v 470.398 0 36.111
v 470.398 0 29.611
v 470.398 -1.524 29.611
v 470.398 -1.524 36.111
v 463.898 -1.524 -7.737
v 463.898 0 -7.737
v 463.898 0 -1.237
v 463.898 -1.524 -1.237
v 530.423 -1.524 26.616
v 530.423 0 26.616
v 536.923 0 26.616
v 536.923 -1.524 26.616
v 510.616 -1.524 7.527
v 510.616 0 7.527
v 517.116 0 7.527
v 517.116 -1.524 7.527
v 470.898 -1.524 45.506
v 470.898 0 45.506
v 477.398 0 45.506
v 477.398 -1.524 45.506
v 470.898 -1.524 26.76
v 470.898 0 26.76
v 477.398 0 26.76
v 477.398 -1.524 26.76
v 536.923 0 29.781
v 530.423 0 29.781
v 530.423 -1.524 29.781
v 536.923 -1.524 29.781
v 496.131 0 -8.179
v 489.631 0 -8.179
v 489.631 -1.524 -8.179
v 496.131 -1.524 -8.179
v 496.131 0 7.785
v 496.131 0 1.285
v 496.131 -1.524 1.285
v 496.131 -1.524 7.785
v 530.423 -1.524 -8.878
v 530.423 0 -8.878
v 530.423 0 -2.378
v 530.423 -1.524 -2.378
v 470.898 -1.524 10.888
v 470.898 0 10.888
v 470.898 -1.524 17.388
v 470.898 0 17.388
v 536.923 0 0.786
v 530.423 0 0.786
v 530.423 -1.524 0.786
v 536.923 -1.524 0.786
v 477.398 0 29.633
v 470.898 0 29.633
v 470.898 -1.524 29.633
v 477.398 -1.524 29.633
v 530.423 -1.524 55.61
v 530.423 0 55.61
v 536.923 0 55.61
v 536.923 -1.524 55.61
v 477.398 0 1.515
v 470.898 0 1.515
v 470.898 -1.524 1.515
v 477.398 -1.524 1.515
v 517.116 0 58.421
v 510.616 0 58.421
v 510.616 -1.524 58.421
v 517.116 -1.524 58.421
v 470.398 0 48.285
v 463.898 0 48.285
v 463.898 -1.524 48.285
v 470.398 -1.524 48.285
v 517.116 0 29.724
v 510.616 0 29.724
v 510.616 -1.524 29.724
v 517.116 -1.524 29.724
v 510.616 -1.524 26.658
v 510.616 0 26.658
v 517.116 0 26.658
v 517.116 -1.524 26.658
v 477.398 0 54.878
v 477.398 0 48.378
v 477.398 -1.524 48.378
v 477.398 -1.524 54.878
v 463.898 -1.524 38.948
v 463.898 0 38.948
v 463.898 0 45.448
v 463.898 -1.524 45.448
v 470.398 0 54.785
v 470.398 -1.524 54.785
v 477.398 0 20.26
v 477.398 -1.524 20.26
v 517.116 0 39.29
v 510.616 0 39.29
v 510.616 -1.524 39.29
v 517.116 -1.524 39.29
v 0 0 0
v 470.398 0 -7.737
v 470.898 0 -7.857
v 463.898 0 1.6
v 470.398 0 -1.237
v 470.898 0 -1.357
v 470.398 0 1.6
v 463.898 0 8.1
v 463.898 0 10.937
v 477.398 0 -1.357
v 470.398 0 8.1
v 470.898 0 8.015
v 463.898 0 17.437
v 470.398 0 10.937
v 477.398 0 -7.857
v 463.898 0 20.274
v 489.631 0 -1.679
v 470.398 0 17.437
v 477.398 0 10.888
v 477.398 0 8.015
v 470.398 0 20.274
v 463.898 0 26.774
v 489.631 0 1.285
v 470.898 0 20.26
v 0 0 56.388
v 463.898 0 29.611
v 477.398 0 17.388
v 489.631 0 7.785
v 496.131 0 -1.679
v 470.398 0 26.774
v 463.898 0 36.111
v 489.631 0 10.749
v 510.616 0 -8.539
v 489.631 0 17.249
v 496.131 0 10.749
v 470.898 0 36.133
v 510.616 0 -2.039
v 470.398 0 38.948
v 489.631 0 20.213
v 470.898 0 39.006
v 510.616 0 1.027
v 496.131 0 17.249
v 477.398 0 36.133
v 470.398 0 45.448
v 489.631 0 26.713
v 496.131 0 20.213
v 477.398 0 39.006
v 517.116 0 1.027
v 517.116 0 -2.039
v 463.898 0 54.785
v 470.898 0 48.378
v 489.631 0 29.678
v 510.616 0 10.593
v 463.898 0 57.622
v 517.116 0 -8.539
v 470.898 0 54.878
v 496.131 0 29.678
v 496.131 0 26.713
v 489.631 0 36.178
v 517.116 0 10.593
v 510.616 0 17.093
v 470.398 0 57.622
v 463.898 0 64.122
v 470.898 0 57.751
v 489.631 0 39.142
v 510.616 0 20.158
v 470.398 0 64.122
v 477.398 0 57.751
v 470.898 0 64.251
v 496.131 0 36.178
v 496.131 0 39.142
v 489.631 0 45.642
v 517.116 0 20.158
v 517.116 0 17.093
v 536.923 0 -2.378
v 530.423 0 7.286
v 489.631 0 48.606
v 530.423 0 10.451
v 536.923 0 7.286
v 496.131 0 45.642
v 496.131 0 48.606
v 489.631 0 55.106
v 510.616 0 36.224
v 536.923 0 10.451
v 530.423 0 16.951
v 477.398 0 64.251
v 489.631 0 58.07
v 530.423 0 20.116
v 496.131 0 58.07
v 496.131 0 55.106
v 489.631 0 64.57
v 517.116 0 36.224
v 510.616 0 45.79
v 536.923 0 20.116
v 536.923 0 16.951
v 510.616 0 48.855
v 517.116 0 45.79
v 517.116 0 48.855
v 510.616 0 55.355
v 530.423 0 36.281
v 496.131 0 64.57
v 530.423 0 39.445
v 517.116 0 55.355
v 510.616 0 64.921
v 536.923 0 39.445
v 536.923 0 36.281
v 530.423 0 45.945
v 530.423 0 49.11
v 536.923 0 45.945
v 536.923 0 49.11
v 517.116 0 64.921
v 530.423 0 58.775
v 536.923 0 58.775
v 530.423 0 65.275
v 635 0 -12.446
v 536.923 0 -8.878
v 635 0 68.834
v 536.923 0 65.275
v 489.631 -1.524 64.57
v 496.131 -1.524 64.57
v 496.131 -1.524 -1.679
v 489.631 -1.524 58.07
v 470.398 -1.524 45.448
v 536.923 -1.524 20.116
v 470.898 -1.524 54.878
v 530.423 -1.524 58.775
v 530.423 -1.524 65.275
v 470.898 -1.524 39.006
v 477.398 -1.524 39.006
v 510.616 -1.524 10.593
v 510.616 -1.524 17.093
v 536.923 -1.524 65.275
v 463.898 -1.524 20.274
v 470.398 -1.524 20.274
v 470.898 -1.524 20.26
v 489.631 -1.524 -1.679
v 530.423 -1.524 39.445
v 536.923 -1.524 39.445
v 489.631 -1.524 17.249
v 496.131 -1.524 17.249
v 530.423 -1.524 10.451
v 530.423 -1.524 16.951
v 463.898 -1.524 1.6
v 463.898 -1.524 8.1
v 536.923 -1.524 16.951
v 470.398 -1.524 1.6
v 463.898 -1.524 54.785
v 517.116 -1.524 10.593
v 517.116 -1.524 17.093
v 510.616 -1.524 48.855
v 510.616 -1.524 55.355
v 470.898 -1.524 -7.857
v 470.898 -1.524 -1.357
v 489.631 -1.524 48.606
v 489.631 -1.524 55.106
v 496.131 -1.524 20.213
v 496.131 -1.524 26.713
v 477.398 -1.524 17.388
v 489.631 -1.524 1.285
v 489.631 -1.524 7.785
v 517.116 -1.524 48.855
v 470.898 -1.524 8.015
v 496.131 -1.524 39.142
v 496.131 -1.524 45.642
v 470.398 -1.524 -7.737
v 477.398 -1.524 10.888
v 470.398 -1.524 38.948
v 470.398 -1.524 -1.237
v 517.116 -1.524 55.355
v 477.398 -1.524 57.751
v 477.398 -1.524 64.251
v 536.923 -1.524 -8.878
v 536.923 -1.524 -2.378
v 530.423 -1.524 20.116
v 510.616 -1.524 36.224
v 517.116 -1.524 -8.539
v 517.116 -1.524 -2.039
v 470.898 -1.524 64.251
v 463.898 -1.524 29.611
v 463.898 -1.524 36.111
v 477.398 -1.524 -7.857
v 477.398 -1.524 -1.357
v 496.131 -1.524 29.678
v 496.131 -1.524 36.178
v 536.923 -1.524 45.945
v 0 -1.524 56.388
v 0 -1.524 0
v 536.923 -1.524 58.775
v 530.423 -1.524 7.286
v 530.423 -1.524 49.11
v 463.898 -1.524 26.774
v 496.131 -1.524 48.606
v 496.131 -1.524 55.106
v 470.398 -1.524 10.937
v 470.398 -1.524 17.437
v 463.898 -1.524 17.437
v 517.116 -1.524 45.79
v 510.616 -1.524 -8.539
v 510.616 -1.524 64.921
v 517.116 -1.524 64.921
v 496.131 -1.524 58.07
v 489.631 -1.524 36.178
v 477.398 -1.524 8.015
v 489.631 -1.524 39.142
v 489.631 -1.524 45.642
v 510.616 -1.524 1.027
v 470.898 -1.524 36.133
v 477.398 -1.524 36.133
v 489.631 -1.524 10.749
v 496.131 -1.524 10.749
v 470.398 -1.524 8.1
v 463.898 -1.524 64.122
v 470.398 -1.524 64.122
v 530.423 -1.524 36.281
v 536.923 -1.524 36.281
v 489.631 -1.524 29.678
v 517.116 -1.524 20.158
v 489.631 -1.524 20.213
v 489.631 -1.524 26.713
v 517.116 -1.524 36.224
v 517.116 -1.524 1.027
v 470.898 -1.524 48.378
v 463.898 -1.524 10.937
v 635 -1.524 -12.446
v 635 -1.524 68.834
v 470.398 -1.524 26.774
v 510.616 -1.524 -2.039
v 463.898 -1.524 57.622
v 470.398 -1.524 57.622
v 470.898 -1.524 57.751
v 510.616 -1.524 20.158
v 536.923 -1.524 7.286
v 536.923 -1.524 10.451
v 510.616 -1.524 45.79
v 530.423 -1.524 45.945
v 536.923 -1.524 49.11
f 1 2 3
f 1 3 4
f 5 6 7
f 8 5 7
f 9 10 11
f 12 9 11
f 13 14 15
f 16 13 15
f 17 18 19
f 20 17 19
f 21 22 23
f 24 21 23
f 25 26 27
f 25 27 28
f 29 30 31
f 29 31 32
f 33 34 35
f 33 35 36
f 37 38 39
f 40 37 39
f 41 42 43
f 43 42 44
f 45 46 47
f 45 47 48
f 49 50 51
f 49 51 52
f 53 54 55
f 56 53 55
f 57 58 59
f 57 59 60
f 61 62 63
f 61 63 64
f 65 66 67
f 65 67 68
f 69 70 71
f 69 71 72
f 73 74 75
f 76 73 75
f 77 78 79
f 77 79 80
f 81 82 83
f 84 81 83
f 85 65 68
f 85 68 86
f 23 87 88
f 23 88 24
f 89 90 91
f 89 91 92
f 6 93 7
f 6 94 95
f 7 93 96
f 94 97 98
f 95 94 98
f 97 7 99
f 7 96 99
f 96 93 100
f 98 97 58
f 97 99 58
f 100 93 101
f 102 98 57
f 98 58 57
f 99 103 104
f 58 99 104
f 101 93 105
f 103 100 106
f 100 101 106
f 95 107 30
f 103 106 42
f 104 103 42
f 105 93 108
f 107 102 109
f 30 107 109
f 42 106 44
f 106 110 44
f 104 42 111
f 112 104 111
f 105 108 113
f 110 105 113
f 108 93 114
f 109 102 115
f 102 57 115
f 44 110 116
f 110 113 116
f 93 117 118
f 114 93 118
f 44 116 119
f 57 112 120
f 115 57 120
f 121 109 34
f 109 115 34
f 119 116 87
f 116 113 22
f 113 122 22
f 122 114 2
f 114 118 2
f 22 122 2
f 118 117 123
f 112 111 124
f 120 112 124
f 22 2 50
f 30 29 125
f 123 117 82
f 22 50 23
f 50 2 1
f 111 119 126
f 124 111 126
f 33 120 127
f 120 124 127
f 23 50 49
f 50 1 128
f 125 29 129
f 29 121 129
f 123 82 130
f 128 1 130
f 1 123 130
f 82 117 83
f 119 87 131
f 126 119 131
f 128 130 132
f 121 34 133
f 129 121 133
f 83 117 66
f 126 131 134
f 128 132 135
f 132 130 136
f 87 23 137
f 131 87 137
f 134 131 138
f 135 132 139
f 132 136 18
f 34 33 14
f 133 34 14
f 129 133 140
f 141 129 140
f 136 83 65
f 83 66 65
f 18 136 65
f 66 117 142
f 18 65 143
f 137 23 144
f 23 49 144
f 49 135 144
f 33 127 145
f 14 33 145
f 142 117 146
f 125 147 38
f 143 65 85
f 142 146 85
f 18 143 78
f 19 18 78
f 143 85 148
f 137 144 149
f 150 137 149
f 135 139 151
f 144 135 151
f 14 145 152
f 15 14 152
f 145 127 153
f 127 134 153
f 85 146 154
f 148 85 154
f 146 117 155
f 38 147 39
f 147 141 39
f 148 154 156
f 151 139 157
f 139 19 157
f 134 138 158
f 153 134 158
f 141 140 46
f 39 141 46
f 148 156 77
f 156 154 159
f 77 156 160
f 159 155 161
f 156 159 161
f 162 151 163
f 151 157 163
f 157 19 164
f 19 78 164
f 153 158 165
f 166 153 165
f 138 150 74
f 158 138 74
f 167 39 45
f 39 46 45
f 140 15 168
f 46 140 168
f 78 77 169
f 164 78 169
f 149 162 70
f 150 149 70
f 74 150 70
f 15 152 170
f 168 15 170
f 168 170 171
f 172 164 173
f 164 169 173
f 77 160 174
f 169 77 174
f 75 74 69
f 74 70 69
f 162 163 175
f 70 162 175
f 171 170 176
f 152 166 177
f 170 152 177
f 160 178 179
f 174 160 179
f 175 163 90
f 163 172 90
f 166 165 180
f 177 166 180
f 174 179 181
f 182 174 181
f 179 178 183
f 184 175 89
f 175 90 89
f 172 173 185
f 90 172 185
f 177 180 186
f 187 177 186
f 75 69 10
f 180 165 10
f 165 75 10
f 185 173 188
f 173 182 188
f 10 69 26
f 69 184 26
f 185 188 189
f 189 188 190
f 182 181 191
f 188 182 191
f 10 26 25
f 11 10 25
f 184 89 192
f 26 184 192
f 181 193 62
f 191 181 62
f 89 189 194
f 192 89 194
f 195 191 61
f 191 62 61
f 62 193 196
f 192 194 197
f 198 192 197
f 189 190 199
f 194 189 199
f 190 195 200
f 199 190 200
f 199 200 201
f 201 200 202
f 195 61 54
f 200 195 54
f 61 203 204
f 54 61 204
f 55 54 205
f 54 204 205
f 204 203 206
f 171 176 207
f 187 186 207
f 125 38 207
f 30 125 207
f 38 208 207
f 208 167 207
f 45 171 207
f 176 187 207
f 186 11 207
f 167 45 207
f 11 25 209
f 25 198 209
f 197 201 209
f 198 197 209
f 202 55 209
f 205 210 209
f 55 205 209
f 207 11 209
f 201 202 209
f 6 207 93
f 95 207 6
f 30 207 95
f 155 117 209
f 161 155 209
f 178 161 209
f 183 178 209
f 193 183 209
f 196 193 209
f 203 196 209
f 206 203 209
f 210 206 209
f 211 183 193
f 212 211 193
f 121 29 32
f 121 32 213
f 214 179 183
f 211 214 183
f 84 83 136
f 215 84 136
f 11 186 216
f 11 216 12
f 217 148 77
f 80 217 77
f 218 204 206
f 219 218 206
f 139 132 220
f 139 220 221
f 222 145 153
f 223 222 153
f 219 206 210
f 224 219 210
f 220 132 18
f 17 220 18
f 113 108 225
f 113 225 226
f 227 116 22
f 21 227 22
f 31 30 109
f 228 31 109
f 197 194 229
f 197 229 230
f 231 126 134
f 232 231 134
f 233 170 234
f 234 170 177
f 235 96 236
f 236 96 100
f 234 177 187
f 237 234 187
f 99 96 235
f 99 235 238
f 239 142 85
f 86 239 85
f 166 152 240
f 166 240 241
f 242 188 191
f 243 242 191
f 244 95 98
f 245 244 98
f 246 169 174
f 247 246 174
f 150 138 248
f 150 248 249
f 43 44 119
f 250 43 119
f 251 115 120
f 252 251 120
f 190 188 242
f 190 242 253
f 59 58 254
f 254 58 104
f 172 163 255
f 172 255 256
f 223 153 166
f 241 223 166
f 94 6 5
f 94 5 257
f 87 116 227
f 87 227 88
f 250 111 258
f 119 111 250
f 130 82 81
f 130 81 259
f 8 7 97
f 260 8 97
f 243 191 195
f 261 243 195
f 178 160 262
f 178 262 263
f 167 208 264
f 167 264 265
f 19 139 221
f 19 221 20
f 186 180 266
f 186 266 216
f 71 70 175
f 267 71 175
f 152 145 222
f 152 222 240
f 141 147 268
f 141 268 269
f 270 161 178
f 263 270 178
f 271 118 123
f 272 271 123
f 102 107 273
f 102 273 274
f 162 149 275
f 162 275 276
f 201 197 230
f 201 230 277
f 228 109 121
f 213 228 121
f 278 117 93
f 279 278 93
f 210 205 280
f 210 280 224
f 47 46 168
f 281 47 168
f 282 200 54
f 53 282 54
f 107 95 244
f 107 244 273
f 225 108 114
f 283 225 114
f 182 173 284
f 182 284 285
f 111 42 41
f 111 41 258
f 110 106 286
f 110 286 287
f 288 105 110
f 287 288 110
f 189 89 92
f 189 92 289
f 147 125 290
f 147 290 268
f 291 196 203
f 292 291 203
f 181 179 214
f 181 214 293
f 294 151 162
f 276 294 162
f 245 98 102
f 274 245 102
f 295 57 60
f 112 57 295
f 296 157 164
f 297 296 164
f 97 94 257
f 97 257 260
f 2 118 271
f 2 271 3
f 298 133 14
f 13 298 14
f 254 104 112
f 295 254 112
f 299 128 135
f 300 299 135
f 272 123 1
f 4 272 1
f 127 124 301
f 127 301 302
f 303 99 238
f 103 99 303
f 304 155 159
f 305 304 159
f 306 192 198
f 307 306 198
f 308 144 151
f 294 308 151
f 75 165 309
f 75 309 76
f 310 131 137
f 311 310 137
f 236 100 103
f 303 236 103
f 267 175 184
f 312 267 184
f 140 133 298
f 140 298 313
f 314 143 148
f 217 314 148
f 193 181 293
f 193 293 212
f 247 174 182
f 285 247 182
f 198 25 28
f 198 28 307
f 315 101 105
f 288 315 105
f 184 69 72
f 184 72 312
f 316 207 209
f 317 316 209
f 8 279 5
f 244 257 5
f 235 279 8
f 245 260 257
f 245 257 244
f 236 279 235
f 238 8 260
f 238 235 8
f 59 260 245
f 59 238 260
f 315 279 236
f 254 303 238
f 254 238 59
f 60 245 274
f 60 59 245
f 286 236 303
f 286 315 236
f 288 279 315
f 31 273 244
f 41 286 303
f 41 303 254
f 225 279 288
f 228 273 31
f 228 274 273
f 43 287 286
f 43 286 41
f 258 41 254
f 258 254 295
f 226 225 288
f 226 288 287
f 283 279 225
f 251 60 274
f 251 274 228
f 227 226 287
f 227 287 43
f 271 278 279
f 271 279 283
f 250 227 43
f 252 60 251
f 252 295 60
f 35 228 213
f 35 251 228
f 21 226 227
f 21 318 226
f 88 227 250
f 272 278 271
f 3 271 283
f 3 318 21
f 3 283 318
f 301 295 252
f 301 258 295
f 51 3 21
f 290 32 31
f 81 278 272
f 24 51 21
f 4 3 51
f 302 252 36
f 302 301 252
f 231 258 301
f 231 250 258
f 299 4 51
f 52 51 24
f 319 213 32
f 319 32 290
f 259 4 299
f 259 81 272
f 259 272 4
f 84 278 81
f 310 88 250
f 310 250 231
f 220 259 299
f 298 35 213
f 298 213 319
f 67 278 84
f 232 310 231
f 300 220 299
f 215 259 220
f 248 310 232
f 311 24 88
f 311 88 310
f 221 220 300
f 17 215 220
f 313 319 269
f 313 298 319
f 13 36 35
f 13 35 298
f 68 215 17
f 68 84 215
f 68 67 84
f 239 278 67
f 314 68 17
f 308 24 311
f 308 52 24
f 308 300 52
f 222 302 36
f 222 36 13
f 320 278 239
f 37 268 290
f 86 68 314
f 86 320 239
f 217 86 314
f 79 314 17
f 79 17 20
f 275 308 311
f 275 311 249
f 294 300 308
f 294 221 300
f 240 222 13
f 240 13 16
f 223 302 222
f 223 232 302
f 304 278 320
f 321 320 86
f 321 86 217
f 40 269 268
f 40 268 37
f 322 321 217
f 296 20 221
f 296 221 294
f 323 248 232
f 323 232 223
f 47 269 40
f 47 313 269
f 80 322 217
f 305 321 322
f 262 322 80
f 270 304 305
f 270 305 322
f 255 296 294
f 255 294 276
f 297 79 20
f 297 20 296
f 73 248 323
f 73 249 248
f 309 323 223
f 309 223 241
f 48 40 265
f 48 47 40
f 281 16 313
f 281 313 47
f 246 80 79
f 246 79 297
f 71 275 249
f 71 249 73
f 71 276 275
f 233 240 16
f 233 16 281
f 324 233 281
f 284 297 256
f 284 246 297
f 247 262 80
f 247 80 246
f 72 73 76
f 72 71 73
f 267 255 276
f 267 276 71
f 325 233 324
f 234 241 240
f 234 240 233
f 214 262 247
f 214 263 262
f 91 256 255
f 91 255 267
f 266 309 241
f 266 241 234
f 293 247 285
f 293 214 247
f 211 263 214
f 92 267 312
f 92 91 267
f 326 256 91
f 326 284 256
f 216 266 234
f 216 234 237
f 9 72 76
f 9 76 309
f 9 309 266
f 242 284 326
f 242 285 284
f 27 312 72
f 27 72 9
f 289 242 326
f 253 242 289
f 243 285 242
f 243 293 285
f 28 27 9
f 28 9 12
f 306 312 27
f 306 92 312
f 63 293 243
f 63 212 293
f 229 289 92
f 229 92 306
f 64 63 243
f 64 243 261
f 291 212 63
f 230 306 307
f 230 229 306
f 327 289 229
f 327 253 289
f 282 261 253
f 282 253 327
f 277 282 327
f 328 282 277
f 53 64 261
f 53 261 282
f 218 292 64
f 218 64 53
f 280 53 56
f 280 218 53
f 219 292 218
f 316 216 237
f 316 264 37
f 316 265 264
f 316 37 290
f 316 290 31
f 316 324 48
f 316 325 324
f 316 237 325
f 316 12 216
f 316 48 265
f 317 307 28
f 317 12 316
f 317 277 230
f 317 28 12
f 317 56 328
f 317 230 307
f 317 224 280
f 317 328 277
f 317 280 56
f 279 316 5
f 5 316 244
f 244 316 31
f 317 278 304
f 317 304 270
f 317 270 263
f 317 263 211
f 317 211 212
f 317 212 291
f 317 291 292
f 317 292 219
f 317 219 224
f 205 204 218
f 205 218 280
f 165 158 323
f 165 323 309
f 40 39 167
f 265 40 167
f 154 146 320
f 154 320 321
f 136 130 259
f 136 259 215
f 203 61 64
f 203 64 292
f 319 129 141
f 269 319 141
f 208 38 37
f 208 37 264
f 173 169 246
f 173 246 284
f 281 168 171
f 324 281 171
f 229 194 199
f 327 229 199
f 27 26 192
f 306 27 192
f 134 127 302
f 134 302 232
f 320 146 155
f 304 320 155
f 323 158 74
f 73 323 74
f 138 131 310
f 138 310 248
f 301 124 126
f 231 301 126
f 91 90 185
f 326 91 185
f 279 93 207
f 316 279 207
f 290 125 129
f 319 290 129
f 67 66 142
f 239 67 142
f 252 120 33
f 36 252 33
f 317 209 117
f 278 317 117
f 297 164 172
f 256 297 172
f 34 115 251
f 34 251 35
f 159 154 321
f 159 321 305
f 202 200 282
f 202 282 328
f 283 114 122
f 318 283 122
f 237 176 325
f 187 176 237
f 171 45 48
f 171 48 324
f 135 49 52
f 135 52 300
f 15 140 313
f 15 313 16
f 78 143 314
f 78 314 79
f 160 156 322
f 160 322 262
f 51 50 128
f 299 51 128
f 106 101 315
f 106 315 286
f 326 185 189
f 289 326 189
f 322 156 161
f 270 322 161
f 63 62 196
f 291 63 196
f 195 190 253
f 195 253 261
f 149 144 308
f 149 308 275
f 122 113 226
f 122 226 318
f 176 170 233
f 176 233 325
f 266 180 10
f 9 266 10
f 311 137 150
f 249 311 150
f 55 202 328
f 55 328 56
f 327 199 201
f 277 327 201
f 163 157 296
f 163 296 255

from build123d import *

# Parameters (mm, degrees)
F0_W     = 6.5
F0_H     = 6.5
F1_DEPTH = 1.524
F3_R     = 1.1303
F4_DEPTH = 972


# Not quite as in the source:
# - an extrude ends at something that could not be found from the text; its depth is read off the source's solid


with BuildPart() as f1:
    # F0 (on Front) → F1 (new body)
    with BuildSketch(Plane.XZ):
        Polygon((0, 56.388), (0, 0), (304.8, -5.97408), (304.8, 62.36208), align=None)
        Polygon((304.8, 62.36208), (304.8, -5.97408), (635, -12.446), (635, 68.834), align=None)
        with Locations((467.1477068, -4.4873331716)):
            Rectangle(F0_W, F0_H, mode=Mode.SUBTRACT)
        with Locations((474.1477436, -4.6073838027)):
            Rectangle(F0_W, F0_H, mode=Mode.SUBTRACT)
        with Locations((467.1477068, 4.8497068284)):
            Rectangle(F0_W, F0_H, mode=Mode.SUBTRACT)
        with Locations((474.1477436, 4.7652161973)):
            Rectangle(F0_W, F0_H, mode=Mode.SUBTRACT)
        with Locations((492.8806754, -4.9286535831)):
            Rectangle(F0_W, F0_H, mode=Mode.SUBTRACT)
        with Locations((513.8657236, -5.2885471597)):
            Rectangle(F0_W, F0_H, mode=Mode.SUBTRACT)
        with Locations((533.6728214, -5.628238887)):
            Rectangle(F0_W, F0_H, mode=Mode.SUBTRACT)
        with Locations((492.8806754, 4.5353864169)):
            Rectangle(F0_W, F0_H, mode=Mode.SUBTRACT)
        with Locations((513.8657236, 4.2770928403)):
            Rectangle(F0_W, F0_H, mode=Mode.SUBTRACT)
        with Locations((533.6728214, 4.036461113)):
            Rectangle(F0_W, F0_H, mode=Mode.SUBTRACT)
        with Locations((467.1477068, 14.1867468284)):
            Rectangle(F0_W, F0_H, mode=Mode.SUBTRACT)
        with Locations((474.1477436, 14.1378161973)):
            Rectangle(F0_W, F0_H, mode=Mode.SUBTRACT)
        with Locations((467.1477068, 23.5237868284)):
            Rectangle(F0_W, F0_H, mode=Mode.SUBTRACT)
        with Locations((474.1477436, 23.5104161973)):
            Rectangle(F0_W, F0_H, mode=Mode.SUBTRACT)
        with Locations((492.8806754, 13.9994264169)):
            Rectangle(F0_W, F0_H, mode=Mode.SUBTRACT)
        with Locations((513.8657236, 13.8427328403)):
            Rectangle(F0_W, F0_H, mode=Mode.SUBTRACT)
        with Locations((533.6728214, 13.701161113)):
            Rectangle(F0_W, F0_H, mode=Mode.SUBTRACT)
        with Locations((492.8806754, 23.4634664169)):
            Rectangle(F0_W, F0_H, mode=Mode.SUBTRACT)
        with Locations((513.8657236, 23.4083728403)):
            Rectangle(F0_W, F0_H, mode=Mode.SUBTRACT)
        with Locations((533.6728214, 23.365861113)):
            Rectangle(F0_W, F0_H, mode=Mode.SUBTRACT)
        with Locations((467.1477068, 32.8608268284)):
            Rectangle(F0_W, F0_H, mode=Mode.SUBTRACT)
        with Locations((474.1477436, 32.8830161973)):
            Rectangle(F0_W, F0_H, mode=Mode.SUBTRACT)
        with Locations((467.1477068, 42.1978668284)):
            Rectangle(F0_W, F0_H, mode=Mode.SUBTRACT)
        with Locations((474.1477436, 42.2556161973)):
            Rectangle(F0_W, F0_H, mode=Mode.SUBTRACT)
        with Locations((492.8806754, 32.9275064169)):
            Rectangle(F0_W, F0_H, mode=Mode.SUBTRACT)
        with Locations((513.8657236, 32.9740128403)):
            Rectangle(F0_W, F0_H, mode=Mode.SUBTRACT)
        with Locations((533.6728214, 33.030561113)):
            Rectangle(F0_W, F0_H, mode=Mode.SUBTRACT)
        with Locations((492.8806754, 42.3915464169)):
            Rectangle(F0_W, F0_H, mode=Mode.SUBTRACT)
        with Locations((513.8657236, 42.5396528403)):
            Rectangle(F0_W, F0_H, mode=Mode.SUBTRACT)
        with Locations((533.6728214, 42.695261113)):
            Rectangle(F0_W, F0_H, mode=Mode.SUBTRACT)
        with Locations((467.1477068, 51.5349068284)):
            Rectangle(F0_W, F0_H, mode=Mode.SUBTRACT)
        with Locations((474.1477436, 51.6282161973)):
            Rectangle(F0_W, F0_H, mode=Mode.SUBTRACT)
        with Locations((467.1477068, 60.8719468284)):
            Rectangle(F0_W, F0_H, mode=Mode.SUBTRACT)
        with Locations((474.1477436, 61.0008161973)):
            Rectangle(F0_W, F0_H, mode=Mode.SUBTRACT)
        with Locations((492.8806754, 51.8555864169)):
            Rectangle(F0_W, F0_H, mode=Mode.SUBTRACT)
        with Locations((513.8657236, 52.1052928403)):
            Rectangle(F0_W, F0_H, mode=Mode.SUBTRACT)
        with Locations((533.6728214, 52.359961113)):
            Rectangle(F0_W, F0_H, mode=Mode.SUBTRACT)
        with Locations((492.8806754, 61.3196264169)):
            Rectangle(F0_W, F0_H, mode=Mode.SUBTRACT)
        with Locations((513.8657236, 61.6709328403)):
            Rectangle(F0_W, F0_H, mode=Mode.SUBTRACT)
        with Locations((533.6728214, 62.024661113)):
            Rectangle(F0_W, F0_H, mode=Mode.SUBTRACT)
    extrude(amount=F1_DEPTH)

    # F3 (on face) → F4 (cut, through all)
    with BuildSketch(Plane.XZ.offset(1.524)):
        with Locations((97.3946236, 8.0847413075)):
            Circle(F3_R)
        with Locations((3.175, 8.1216754)):
            Circle(F3_R)
        with Locations((181.3279076, 8.0518394602)):
            Circle(F3_R)
        with Locations((290.391088, 8.0090866935)):
            Circle(F3_R)
        with Locations((409.2984448, 7.9624750096)):
            Circle(F3_R)
        with Locations((524.05534, 7.9174903067)):
            Circle(F3_R)
        with Locations((624.435886, 7.8781411327)):
            Circle(F3_R)
        with Locations((97.3946236, 48.3032586925)):
            Circle(F3_R)
        with Locations((3.175, 48.2663246)):
            Circle(F3_R)
        with Locations((181.3279076, 48.3361605398)):
            Circle(F3_R)
        with Locations((290.391088, 48.3789133065)):
            Circle(F3_R)
        with Locations((409.2984448, 48.4255249904)):
            Circle(F3_R)
        with Locations((524.05534, 48.4705096933)):
            Circle(F3_R)
        with Locations((624.435886, 48.5098588673)):
            Circle(F3_R)
    extrude(amount=F4_DEPTH, mode=Mode.SUBTRACT)


solid = f1.part
